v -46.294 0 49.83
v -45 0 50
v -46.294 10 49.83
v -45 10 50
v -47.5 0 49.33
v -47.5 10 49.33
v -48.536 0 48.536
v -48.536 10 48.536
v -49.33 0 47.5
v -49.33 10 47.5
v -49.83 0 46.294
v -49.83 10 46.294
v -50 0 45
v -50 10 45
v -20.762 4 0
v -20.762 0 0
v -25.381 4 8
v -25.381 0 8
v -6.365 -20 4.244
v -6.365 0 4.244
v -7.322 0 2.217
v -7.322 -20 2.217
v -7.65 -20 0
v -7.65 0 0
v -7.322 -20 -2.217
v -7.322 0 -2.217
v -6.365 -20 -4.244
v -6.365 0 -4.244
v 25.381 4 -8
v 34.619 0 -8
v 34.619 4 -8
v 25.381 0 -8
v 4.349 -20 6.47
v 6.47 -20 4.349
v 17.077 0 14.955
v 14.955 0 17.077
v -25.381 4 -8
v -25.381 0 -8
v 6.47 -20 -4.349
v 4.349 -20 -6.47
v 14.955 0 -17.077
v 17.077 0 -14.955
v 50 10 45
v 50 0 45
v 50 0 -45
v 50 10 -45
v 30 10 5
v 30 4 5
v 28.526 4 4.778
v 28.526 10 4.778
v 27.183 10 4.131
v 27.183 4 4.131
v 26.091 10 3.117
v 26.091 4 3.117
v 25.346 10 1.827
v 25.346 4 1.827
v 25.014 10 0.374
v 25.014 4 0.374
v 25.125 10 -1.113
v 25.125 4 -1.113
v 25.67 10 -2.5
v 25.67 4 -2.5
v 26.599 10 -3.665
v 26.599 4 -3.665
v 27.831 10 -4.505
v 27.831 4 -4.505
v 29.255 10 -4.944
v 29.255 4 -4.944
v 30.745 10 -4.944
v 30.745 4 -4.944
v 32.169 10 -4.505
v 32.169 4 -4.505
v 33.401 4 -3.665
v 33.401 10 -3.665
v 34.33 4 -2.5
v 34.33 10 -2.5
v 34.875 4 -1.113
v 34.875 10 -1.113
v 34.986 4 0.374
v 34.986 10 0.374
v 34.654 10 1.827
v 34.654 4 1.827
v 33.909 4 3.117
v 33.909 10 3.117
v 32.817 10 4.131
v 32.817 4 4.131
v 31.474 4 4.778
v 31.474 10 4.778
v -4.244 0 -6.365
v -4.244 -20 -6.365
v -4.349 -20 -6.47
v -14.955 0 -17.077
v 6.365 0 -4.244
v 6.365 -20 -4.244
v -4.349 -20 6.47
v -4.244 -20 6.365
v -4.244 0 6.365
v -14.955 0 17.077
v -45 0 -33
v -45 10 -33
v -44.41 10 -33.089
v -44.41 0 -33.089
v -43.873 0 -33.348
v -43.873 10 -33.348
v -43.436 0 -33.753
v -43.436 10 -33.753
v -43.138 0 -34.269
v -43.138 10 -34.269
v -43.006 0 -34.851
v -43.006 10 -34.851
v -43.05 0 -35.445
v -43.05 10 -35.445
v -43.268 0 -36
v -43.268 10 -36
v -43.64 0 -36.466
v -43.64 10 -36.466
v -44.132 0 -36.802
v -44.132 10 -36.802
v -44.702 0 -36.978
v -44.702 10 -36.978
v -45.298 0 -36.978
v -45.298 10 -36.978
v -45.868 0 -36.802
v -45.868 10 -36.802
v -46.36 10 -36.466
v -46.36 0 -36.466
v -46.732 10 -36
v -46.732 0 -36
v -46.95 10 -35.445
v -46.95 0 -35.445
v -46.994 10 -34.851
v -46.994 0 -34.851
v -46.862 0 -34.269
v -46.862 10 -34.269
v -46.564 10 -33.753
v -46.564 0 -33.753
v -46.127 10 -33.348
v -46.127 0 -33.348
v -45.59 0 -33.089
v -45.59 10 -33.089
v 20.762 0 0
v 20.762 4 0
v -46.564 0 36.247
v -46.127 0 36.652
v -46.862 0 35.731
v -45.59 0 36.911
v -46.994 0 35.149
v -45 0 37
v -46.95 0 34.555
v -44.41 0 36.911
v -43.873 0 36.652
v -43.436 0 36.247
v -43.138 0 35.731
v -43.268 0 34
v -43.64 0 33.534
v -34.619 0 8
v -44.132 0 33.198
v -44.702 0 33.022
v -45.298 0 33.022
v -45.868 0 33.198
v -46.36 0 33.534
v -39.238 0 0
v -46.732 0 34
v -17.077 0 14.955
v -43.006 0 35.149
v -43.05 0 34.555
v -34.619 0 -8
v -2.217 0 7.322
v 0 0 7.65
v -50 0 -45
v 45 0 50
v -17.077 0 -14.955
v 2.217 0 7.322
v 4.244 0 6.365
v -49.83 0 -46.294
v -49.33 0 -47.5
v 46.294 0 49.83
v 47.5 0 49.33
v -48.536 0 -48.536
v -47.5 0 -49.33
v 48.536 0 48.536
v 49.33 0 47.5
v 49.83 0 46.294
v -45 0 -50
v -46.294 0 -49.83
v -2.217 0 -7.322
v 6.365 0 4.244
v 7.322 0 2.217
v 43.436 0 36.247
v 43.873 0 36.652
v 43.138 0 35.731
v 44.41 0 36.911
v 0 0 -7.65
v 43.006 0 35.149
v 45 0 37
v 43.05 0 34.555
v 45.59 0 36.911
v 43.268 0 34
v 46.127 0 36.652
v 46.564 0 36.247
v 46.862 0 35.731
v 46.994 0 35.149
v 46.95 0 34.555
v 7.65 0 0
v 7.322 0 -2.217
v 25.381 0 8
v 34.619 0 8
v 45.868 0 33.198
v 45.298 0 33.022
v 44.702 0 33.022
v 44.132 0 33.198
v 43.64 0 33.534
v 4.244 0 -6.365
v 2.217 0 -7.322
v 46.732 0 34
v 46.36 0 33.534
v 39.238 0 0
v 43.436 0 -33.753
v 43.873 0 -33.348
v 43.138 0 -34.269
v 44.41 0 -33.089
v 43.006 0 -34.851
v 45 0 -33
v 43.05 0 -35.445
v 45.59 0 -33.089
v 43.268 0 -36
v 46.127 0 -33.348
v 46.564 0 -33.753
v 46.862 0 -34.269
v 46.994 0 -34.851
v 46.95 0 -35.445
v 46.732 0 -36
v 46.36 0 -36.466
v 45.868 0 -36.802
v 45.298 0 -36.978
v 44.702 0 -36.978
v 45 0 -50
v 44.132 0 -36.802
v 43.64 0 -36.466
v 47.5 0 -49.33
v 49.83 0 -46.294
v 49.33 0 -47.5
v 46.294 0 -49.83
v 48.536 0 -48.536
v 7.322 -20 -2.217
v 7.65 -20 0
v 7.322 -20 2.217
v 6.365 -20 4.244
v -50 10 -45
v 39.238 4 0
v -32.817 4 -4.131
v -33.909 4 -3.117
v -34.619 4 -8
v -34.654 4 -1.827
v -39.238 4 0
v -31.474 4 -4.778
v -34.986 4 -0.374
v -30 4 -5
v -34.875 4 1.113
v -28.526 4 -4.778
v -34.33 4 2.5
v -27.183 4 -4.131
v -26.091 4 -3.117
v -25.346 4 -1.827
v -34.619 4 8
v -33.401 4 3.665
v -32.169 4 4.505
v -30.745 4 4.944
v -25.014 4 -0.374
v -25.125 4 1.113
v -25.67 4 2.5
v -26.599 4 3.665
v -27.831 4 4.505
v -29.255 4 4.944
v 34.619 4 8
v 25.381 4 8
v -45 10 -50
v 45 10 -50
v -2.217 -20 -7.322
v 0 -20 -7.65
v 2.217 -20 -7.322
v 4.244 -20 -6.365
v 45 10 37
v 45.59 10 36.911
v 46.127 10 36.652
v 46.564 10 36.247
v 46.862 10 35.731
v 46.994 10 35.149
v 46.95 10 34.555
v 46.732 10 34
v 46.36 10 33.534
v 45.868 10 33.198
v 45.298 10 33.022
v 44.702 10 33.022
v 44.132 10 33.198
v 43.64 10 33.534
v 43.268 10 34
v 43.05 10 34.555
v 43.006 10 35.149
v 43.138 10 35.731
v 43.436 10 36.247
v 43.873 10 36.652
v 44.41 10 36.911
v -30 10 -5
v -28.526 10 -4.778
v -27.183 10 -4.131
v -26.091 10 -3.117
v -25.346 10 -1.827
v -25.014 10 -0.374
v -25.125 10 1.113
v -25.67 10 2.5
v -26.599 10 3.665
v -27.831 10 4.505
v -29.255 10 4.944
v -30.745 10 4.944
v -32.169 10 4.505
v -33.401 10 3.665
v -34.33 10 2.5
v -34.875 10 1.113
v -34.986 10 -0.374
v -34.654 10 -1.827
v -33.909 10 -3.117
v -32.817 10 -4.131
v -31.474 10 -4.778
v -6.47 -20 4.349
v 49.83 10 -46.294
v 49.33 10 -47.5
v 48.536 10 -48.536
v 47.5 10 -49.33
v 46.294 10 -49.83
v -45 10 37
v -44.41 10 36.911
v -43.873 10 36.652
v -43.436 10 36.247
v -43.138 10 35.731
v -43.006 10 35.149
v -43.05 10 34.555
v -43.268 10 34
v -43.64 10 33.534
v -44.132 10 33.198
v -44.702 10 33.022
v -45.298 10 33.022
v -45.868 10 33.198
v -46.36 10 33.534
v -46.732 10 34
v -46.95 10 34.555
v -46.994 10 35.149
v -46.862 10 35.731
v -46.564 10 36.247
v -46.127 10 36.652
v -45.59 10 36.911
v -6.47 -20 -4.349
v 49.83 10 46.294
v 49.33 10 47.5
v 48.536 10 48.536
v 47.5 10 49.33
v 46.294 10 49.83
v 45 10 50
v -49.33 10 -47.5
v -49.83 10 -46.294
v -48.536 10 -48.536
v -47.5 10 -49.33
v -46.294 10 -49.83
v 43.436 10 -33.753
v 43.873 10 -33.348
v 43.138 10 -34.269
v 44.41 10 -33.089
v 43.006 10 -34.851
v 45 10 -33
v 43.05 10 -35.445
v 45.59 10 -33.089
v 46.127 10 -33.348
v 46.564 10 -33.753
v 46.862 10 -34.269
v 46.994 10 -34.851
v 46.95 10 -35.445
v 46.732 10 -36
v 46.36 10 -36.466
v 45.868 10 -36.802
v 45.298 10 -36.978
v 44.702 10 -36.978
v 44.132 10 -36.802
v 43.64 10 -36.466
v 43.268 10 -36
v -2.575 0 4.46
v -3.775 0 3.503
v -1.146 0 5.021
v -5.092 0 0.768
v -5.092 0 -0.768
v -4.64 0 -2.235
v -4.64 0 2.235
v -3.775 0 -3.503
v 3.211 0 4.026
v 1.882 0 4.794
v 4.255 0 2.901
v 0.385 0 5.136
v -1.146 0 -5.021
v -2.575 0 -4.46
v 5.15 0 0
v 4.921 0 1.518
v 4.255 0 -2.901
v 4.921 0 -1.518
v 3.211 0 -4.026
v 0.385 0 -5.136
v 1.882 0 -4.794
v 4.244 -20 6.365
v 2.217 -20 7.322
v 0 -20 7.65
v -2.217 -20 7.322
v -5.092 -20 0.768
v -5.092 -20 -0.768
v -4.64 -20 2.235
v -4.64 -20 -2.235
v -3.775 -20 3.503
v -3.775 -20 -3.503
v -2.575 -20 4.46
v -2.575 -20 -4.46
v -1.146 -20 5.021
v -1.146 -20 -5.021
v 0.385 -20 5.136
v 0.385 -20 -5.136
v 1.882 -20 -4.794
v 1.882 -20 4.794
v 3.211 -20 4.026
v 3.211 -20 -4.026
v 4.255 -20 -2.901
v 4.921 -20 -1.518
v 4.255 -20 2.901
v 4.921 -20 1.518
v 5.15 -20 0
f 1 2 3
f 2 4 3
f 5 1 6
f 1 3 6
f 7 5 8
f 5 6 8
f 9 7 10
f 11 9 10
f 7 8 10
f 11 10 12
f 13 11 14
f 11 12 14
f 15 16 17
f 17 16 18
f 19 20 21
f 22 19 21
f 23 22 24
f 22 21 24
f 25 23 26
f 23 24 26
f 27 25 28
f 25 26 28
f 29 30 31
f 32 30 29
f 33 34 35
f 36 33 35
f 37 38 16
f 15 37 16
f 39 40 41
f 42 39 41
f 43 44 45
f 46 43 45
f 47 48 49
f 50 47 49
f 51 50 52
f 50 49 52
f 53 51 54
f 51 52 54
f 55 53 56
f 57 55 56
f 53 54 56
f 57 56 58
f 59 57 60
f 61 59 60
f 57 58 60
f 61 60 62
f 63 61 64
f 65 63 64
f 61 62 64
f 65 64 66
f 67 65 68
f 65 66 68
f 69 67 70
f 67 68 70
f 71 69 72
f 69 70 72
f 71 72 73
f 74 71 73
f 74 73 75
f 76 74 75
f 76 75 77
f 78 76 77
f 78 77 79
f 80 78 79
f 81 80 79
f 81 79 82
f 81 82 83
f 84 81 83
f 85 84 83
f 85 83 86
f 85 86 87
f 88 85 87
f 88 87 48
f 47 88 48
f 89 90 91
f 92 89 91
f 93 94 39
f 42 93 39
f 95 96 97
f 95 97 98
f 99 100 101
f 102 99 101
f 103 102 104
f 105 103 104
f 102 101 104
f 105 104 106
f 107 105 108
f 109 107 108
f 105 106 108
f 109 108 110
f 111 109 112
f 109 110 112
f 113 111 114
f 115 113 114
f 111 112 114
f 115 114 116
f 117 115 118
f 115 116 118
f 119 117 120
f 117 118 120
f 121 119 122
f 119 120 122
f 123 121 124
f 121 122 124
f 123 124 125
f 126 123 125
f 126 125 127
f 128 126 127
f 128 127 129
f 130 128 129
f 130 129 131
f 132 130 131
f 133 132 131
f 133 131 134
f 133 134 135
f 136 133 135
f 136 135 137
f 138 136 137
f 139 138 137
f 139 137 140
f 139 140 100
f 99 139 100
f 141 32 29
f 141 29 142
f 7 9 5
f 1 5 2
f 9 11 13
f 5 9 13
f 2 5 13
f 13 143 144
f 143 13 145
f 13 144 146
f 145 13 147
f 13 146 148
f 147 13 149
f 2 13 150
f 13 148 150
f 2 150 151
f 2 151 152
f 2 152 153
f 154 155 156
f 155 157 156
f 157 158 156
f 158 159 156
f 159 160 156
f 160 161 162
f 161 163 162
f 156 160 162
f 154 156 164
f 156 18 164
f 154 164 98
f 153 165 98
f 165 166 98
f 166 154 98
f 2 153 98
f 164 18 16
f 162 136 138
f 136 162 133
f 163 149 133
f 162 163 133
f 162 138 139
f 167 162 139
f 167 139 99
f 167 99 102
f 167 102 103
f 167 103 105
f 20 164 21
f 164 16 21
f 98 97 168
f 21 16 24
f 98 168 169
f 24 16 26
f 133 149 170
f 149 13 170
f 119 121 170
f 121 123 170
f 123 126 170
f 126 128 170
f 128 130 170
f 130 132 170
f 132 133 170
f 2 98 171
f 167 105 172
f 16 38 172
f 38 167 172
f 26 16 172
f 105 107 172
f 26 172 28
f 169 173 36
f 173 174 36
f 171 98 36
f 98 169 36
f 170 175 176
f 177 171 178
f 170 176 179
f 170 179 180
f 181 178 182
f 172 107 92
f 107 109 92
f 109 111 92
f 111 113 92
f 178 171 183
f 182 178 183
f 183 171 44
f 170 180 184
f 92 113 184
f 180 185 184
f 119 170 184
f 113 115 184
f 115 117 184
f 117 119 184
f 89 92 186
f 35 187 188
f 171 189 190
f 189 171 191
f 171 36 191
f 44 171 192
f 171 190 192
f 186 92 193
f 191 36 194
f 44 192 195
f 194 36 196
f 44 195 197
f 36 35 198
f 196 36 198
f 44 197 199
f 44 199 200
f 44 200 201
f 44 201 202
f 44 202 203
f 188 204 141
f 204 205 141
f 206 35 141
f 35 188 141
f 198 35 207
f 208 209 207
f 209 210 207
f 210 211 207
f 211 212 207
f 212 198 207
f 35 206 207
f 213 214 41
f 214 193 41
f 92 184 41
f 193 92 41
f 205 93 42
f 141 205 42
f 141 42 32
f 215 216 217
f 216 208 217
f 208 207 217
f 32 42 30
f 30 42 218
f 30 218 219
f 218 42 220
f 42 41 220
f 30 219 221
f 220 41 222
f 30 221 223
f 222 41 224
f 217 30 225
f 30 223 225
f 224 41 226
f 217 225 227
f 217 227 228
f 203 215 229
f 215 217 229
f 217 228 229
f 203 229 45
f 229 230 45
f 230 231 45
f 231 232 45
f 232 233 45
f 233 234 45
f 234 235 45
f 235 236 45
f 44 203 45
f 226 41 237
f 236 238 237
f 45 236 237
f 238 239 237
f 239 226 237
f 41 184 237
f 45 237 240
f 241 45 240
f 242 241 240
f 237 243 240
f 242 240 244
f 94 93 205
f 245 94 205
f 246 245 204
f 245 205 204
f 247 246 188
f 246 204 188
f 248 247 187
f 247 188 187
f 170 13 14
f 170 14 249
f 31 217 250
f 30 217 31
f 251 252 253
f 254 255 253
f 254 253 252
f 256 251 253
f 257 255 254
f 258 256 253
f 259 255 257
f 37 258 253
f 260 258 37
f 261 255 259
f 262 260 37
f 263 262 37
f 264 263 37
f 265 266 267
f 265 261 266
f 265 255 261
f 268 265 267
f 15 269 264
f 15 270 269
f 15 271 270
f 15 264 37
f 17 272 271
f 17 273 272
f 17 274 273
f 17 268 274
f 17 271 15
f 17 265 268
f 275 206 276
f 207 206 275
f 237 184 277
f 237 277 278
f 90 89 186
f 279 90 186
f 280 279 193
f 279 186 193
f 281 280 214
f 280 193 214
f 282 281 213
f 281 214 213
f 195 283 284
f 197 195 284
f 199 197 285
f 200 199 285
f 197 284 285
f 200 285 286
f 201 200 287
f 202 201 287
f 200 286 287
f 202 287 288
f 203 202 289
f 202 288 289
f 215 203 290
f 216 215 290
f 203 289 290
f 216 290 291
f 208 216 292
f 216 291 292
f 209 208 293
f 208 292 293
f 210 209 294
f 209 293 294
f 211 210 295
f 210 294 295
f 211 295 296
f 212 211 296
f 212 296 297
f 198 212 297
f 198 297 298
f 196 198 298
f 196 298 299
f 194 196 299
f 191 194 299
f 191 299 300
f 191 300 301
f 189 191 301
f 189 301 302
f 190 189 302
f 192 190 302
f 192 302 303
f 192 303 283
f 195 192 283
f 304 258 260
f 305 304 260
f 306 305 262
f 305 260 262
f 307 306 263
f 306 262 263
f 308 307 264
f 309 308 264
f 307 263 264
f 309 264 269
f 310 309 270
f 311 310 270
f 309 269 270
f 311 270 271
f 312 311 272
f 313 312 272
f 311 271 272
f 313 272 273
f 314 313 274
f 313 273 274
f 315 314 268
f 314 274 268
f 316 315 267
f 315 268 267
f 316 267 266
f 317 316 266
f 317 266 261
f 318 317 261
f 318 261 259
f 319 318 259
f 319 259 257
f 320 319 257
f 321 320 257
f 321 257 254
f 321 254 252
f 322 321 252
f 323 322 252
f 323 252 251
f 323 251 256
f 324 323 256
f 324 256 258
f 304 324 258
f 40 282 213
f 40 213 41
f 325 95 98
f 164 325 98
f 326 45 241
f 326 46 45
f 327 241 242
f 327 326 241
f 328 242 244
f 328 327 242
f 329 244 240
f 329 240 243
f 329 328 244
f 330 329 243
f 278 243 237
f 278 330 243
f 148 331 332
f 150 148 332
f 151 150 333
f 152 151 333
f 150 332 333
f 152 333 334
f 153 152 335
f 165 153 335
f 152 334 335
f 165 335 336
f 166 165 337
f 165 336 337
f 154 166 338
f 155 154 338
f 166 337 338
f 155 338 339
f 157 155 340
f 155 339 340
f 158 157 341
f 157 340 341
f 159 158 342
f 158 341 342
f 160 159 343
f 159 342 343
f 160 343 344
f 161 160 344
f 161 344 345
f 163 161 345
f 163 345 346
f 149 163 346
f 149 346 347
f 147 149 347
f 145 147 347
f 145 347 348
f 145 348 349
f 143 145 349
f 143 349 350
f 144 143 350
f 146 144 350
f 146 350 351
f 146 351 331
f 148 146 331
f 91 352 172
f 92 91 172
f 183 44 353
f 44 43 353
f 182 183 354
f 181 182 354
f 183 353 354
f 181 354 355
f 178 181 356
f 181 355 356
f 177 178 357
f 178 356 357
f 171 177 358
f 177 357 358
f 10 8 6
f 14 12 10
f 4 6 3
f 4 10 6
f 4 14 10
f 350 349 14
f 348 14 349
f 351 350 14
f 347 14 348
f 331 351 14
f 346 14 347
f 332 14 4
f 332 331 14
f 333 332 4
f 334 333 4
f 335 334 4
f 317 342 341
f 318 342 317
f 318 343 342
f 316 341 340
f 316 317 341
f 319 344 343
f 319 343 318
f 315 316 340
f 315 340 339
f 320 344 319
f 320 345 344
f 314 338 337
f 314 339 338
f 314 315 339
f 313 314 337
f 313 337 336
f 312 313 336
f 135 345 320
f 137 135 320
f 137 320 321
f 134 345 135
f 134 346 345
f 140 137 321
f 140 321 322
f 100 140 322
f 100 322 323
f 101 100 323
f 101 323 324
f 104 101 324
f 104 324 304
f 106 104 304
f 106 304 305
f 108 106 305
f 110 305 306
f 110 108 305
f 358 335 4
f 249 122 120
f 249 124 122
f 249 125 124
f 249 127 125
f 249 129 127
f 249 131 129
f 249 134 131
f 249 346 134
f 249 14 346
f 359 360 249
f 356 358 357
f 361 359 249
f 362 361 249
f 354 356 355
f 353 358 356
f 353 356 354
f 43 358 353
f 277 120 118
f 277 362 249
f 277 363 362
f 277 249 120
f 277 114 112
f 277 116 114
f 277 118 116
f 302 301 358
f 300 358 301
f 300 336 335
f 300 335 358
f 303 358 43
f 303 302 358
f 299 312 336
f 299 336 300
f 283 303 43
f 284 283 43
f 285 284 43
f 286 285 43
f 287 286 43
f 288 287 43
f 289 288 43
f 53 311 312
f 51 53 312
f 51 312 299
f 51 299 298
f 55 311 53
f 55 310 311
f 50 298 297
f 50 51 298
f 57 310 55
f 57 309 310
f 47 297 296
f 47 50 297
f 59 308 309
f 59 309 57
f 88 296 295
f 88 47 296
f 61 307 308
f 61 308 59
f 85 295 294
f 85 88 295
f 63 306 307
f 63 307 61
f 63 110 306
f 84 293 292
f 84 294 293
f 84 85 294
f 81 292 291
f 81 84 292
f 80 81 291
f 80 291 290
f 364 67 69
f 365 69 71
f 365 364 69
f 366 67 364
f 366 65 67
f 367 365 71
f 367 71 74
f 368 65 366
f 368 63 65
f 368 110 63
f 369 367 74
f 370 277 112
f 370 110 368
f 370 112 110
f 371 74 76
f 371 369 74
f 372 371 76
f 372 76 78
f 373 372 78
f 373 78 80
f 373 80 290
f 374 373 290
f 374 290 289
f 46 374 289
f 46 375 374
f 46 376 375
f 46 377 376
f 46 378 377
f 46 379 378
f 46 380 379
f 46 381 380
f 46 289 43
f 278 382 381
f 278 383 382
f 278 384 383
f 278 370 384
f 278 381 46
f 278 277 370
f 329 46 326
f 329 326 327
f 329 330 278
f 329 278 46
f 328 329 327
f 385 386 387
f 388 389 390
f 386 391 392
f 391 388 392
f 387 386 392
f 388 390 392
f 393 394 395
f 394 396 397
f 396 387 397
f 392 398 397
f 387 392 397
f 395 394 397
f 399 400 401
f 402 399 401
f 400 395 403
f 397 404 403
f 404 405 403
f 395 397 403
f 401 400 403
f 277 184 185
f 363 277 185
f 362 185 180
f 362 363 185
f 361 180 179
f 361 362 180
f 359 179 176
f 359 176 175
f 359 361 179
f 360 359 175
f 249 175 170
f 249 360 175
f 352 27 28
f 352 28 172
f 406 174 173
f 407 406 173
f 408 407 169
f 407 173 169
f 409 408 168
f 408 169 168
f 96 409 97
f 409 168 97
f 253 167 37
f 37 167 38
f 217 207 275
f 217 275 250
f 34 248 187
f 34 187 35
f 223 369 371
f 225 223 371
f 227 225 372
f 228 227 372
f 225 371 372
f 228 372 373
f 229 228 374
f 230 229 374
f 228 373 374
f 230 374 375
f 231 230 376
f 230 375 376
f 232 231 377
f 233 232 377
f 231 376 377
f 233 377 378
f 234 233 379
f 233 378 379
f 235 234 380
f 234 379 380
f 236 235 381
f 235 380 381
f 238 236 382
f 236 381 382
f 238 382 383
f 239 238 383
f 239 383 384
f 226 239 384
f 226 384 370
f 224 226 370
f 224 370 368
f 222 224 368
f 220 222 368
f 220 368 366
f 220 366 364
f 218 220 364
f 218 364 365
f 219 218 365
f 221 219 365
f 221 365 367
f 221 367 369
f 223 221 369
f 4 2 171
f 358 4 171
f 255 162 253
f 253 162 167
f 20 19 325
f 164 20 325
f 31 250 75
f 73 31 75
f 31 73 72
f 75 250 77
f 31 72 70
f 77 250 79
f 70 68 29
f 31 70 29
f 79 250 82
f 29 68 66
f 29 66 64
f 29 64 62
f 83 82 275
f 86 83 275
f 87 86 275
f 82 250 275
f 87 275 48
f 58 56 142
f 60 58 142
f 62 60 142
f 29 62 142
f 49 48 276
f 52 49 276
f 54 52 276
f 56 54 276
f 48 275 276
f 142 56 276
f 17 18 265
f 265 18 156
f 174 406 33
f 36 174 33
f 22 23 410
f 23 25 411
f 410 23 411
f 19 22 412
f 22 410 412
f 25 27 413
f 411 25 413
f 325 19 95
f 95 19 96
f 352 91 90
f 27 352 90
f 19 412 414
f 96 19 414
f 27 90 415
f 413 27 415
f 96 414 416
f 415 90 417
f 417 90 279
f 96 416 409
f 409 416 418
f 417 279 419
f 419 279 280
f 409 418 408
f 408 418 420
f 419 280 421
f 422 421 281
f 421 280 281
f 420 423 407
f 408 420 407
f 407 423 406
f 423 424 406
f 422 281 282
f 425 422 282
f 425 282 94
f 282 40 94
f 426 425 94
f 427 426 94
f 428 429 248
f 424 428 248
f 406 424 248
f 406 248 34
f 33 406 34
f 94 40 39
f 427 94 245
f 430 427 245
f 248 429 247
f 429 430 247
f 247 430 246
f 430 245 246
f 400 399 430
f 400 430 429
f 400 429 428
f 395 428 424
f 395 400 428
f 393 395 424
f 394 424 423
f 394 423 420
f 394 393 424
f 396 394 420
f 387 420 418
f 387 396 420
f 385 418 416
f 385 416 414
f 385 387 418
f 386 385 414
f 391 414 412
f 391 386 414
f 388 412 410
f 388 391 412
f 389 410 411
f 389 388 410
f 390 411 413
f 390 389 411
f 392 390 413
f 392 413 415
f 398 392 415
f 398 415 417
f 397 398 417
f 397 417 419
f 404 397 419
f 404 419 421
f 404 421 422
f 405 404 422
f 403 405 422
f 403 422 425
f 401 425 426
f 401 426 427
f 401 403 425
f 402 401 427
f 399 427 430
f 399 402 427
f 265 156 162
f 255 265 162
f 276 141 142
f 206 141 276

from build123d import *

# Parameters (mm, degrees)
SKETCH1_W           = 100
SKETCH1_H           = 100
BOSS_EXTRUDE1_DEPTH = 10
SKETCH2_R           = 2
CUT_EXTRUDE1_DEPTH  = 72.414284285
CUT_EXTRUDE2_DEPTH  = 4
SKETCH4_R           = 5
CUT_EXTRUDE3_DEPTH  = 71.964779997
SKETCH5_R           = 7.65
SKETCH5_R_2         = 5.15
EXTRUDE_THIN1_DEPTH = 20
RIB6_START          = -1.5
RIB6_DEPTH          = 3
CIRPATTERN2_COUNT   = 4
FILLET1_R           = 5


with BuildPart() as part:
    # Sketch1 → Boss-Extrude1 (new body)
    with BuildSketch(Plane(origin=(0, 0, 0), x_dir=(1, 0, 0), z_dir=(0, 1, 0))):
        Rectangle(SKETCH1_W, SKETCH1_H)
    extrude(amount=BOSS_EXTRUDE1_DEPTH)

    # Sketch2 → Cut-Extrude1 (cut, through all)
    with BuildSketch(Plane(origin=(0, 10, 0), x_dir=(1, 0, 0), z_dir=(0, 1, 0))):
        with Locations(Location((-45, 35, 0), (0, 0, 270))):
            Circle(SKETCH2_R)
        with Locations(Location((45, 35, 0), (0, 0, 270))):
            Circle(SKETCH2_R)
        with Locations(Location((45, -35, 0), (0, 0, 270))):
            Circle(SKETCH2_R)
        with Locations(Location((-45, -35, 0), (0, 0, 270))):
            Circle(SKETCH2_R)
    extrude(amount=-CUT_EXTRUDE1_DEPTH, mode=Mode.SUBTRACT)

    # Sketch3 → Cut-Extrude2 (cut)
    with BuildSketch(Plane.XZ):
        Polygon((-20.762395693, 0), (-25.381197846, 8), (-34.618802154, 8), (-39.237604307, 0), (-34.618802154, -8), (-25.381197846, -8), align=None)
        Polygon((25.381197846, -8), (20.762395693, 0), (25.381197846, 8), (34.618802154, 8), (39.237604307, 0), (34.618802154, -8), align=None)
    extrude(amount=-CUT_EXTRUDE2_DEPTH, mode=Mode.SUBTRACT)

    # Sketch4 → Cut-Extrude3 (cut, through all)
    with BuildSketch(Plane.XZ.offset(-4)):
        with Locations(Location((-30, 0, 0), (0, 0, 270))):
            Circle(SKETCH4_R)
        with Locations(Location((30, 0, 0), (0, 0, 90))):
            Circle(SKETCH4_R)
    extrude(amount=-CUT_EXTRUDE3_DEPTH, mode=Mode.SUBTRACT)

    # Sketch5 → Extrude-Thin1 (add)
    with BuildSketch(Plane.XZ):
        Circle(SKETCH5_R)
        Circle(SKETCH5_R_2, mode=Mode.SUBTRACT)
    extrude(amount=EXTRUDE_THIN1_DEPTH)

    # Rib6: read off the stored shape, not the designer's step
    # Rib6 outline → Rib6 (add)
    with BuildSketch(Plane(origin=(0, 0, 0), x_dir=(0.7071067811865461, 0, -0.7071067811865489), z_dir=(0.7071067811865489, 0, 0.7071067811865461)).offset(RIB6_START)):
        Polygon((7.65, -20), (22.65, 0), (7.50149985, 0), (7.50149985, -20), align=None)
    rib6 = extrude(amount=RIB6_DEPTH)

    # CirPattern2: Rib6 ×4 about axis
    cirpattern2_axis = Axis((0, 0, 0), (0, 1, 0))
    for i in range(1, CIRPATTERN2_COUNT):
        add(rib6.rotate(cirpattern2_axis, i * 360 / CIRPATTERN2_COUNT))

    # Fillet1
    fillet1_edges = [part.edges().sort_by_distance(p)[0] for p in [
        (50, 5, 50),
        (-50, 5, 50),
        (-50, 5, -50),
        (50, 5, -50),
    ]]
    fillet(fillet1_edges, radius=FILLET1_R)


solid = part.part
